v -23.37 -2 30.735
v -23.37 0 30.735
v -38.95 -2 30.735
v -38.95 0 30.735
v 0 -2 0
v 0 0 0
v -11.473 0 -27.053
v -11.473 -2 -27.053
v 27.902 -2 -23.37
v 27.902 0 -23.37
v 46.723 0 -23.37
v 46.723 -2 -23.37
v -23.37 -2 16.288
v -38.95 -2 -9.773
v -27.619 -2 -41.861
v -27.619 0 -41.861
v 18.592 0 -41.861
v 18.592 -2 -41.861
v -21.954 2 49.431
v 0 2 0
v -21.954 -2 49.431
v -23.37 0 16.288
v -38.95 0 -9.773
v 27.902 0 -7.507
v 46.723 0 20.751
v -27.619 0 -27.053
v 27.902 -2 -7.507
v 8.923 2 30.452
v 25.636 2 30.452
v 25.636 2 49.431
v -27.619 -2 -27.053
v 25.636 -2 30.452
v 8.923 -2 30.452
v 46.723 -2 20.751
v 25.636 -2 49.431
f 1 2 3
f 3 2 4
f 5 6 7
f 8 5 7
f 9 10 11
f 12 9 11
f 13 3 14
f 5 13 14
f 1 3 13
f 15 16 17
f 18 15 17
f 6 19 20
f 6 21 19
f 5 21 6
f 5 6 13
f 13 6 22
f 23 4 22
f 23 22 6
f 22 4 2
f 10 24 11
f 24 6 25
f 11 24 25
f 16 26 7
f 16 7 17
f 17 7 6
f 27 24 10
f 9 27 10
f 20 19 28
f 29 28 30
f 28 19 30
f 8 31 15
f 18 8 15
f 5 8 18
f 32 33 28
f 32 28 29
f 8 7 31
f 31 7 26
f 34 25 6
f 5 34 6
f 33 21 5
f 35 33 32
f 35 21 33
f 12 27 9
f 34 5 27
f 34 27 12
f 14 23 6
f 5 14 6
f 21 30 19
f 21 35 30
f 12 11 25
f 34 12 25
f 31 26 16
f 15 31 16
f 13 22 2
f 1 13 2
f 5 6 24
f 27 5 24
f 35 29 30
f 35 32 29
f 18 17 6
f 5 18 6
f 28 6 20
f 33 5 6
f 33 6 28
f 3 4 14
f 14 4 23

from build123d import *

# Parameters (mm, degrees)
F1_DEPTH = 2


with BuildPart() as f1:
    # F0 (on Front) → F1 (new body)
    with BuildSketch(Plane.XZ):
        Polygon((-21.9536889344, 49.4312047958), (0, 0), (8.9231124148, 30.4518900812), (25.6362445652, 30.4518900812), (25.6362445652, 49.4312047958), align=None)
    extrude(amount=F1_DEPTH)



with BuildPart() as f1b:
    # F0 (on Front) → F1, piece 2 (new body)
    with BuildSketch(Plane.XZ):
        Polygon((46.7234810933, 20.7511181266), (0, 0), (27.9024317861, -7.5067449361), (27.9024317861, -23.3700536191), (46.7234810933, -23.3700536191), align=None)
    extrude(amount=F1_DEPTH)


with BuildPart() as f1c:
    # F0 (on Front) → F1, piece 3 (new body)
    with BuildSketch(Plane.XZ):
        Polygon((18.5916709277, -41.8612423573), (0, 0), (-11.4725725725, -27.0526073873), (-27.6191551238, -27.0526073873), (-27.6191551238, -41.8612423573), align=None)
    extrude(amount=F1_DEPTH)


with BuildPart() as f1d:
    # F0 (on Front) → F1, piece 4 (new body)
    with BuildSketch(Plane.XZ):
        Polygon((-38.9500930905, -9.7729321569), (0, 0), (-23.3700554818, 16.2882208824), (-23.3700554818, 30.7351611555), (-38.9500930905, 30.7351611555), align=None)
    extrude(amount=F1_DEPTH)


with BuildPart() as f1_1:
    add(f1.part)

    add(f1b.part)  # F2 merges F1b

    add(f1c.part)  # F2 merges F1c

    add(f1d.part)  # F2 merges F1d
    # F2: F1 across plane
    add(f1.part.mirror(Plane.XZ))


solid = f1_1.part
